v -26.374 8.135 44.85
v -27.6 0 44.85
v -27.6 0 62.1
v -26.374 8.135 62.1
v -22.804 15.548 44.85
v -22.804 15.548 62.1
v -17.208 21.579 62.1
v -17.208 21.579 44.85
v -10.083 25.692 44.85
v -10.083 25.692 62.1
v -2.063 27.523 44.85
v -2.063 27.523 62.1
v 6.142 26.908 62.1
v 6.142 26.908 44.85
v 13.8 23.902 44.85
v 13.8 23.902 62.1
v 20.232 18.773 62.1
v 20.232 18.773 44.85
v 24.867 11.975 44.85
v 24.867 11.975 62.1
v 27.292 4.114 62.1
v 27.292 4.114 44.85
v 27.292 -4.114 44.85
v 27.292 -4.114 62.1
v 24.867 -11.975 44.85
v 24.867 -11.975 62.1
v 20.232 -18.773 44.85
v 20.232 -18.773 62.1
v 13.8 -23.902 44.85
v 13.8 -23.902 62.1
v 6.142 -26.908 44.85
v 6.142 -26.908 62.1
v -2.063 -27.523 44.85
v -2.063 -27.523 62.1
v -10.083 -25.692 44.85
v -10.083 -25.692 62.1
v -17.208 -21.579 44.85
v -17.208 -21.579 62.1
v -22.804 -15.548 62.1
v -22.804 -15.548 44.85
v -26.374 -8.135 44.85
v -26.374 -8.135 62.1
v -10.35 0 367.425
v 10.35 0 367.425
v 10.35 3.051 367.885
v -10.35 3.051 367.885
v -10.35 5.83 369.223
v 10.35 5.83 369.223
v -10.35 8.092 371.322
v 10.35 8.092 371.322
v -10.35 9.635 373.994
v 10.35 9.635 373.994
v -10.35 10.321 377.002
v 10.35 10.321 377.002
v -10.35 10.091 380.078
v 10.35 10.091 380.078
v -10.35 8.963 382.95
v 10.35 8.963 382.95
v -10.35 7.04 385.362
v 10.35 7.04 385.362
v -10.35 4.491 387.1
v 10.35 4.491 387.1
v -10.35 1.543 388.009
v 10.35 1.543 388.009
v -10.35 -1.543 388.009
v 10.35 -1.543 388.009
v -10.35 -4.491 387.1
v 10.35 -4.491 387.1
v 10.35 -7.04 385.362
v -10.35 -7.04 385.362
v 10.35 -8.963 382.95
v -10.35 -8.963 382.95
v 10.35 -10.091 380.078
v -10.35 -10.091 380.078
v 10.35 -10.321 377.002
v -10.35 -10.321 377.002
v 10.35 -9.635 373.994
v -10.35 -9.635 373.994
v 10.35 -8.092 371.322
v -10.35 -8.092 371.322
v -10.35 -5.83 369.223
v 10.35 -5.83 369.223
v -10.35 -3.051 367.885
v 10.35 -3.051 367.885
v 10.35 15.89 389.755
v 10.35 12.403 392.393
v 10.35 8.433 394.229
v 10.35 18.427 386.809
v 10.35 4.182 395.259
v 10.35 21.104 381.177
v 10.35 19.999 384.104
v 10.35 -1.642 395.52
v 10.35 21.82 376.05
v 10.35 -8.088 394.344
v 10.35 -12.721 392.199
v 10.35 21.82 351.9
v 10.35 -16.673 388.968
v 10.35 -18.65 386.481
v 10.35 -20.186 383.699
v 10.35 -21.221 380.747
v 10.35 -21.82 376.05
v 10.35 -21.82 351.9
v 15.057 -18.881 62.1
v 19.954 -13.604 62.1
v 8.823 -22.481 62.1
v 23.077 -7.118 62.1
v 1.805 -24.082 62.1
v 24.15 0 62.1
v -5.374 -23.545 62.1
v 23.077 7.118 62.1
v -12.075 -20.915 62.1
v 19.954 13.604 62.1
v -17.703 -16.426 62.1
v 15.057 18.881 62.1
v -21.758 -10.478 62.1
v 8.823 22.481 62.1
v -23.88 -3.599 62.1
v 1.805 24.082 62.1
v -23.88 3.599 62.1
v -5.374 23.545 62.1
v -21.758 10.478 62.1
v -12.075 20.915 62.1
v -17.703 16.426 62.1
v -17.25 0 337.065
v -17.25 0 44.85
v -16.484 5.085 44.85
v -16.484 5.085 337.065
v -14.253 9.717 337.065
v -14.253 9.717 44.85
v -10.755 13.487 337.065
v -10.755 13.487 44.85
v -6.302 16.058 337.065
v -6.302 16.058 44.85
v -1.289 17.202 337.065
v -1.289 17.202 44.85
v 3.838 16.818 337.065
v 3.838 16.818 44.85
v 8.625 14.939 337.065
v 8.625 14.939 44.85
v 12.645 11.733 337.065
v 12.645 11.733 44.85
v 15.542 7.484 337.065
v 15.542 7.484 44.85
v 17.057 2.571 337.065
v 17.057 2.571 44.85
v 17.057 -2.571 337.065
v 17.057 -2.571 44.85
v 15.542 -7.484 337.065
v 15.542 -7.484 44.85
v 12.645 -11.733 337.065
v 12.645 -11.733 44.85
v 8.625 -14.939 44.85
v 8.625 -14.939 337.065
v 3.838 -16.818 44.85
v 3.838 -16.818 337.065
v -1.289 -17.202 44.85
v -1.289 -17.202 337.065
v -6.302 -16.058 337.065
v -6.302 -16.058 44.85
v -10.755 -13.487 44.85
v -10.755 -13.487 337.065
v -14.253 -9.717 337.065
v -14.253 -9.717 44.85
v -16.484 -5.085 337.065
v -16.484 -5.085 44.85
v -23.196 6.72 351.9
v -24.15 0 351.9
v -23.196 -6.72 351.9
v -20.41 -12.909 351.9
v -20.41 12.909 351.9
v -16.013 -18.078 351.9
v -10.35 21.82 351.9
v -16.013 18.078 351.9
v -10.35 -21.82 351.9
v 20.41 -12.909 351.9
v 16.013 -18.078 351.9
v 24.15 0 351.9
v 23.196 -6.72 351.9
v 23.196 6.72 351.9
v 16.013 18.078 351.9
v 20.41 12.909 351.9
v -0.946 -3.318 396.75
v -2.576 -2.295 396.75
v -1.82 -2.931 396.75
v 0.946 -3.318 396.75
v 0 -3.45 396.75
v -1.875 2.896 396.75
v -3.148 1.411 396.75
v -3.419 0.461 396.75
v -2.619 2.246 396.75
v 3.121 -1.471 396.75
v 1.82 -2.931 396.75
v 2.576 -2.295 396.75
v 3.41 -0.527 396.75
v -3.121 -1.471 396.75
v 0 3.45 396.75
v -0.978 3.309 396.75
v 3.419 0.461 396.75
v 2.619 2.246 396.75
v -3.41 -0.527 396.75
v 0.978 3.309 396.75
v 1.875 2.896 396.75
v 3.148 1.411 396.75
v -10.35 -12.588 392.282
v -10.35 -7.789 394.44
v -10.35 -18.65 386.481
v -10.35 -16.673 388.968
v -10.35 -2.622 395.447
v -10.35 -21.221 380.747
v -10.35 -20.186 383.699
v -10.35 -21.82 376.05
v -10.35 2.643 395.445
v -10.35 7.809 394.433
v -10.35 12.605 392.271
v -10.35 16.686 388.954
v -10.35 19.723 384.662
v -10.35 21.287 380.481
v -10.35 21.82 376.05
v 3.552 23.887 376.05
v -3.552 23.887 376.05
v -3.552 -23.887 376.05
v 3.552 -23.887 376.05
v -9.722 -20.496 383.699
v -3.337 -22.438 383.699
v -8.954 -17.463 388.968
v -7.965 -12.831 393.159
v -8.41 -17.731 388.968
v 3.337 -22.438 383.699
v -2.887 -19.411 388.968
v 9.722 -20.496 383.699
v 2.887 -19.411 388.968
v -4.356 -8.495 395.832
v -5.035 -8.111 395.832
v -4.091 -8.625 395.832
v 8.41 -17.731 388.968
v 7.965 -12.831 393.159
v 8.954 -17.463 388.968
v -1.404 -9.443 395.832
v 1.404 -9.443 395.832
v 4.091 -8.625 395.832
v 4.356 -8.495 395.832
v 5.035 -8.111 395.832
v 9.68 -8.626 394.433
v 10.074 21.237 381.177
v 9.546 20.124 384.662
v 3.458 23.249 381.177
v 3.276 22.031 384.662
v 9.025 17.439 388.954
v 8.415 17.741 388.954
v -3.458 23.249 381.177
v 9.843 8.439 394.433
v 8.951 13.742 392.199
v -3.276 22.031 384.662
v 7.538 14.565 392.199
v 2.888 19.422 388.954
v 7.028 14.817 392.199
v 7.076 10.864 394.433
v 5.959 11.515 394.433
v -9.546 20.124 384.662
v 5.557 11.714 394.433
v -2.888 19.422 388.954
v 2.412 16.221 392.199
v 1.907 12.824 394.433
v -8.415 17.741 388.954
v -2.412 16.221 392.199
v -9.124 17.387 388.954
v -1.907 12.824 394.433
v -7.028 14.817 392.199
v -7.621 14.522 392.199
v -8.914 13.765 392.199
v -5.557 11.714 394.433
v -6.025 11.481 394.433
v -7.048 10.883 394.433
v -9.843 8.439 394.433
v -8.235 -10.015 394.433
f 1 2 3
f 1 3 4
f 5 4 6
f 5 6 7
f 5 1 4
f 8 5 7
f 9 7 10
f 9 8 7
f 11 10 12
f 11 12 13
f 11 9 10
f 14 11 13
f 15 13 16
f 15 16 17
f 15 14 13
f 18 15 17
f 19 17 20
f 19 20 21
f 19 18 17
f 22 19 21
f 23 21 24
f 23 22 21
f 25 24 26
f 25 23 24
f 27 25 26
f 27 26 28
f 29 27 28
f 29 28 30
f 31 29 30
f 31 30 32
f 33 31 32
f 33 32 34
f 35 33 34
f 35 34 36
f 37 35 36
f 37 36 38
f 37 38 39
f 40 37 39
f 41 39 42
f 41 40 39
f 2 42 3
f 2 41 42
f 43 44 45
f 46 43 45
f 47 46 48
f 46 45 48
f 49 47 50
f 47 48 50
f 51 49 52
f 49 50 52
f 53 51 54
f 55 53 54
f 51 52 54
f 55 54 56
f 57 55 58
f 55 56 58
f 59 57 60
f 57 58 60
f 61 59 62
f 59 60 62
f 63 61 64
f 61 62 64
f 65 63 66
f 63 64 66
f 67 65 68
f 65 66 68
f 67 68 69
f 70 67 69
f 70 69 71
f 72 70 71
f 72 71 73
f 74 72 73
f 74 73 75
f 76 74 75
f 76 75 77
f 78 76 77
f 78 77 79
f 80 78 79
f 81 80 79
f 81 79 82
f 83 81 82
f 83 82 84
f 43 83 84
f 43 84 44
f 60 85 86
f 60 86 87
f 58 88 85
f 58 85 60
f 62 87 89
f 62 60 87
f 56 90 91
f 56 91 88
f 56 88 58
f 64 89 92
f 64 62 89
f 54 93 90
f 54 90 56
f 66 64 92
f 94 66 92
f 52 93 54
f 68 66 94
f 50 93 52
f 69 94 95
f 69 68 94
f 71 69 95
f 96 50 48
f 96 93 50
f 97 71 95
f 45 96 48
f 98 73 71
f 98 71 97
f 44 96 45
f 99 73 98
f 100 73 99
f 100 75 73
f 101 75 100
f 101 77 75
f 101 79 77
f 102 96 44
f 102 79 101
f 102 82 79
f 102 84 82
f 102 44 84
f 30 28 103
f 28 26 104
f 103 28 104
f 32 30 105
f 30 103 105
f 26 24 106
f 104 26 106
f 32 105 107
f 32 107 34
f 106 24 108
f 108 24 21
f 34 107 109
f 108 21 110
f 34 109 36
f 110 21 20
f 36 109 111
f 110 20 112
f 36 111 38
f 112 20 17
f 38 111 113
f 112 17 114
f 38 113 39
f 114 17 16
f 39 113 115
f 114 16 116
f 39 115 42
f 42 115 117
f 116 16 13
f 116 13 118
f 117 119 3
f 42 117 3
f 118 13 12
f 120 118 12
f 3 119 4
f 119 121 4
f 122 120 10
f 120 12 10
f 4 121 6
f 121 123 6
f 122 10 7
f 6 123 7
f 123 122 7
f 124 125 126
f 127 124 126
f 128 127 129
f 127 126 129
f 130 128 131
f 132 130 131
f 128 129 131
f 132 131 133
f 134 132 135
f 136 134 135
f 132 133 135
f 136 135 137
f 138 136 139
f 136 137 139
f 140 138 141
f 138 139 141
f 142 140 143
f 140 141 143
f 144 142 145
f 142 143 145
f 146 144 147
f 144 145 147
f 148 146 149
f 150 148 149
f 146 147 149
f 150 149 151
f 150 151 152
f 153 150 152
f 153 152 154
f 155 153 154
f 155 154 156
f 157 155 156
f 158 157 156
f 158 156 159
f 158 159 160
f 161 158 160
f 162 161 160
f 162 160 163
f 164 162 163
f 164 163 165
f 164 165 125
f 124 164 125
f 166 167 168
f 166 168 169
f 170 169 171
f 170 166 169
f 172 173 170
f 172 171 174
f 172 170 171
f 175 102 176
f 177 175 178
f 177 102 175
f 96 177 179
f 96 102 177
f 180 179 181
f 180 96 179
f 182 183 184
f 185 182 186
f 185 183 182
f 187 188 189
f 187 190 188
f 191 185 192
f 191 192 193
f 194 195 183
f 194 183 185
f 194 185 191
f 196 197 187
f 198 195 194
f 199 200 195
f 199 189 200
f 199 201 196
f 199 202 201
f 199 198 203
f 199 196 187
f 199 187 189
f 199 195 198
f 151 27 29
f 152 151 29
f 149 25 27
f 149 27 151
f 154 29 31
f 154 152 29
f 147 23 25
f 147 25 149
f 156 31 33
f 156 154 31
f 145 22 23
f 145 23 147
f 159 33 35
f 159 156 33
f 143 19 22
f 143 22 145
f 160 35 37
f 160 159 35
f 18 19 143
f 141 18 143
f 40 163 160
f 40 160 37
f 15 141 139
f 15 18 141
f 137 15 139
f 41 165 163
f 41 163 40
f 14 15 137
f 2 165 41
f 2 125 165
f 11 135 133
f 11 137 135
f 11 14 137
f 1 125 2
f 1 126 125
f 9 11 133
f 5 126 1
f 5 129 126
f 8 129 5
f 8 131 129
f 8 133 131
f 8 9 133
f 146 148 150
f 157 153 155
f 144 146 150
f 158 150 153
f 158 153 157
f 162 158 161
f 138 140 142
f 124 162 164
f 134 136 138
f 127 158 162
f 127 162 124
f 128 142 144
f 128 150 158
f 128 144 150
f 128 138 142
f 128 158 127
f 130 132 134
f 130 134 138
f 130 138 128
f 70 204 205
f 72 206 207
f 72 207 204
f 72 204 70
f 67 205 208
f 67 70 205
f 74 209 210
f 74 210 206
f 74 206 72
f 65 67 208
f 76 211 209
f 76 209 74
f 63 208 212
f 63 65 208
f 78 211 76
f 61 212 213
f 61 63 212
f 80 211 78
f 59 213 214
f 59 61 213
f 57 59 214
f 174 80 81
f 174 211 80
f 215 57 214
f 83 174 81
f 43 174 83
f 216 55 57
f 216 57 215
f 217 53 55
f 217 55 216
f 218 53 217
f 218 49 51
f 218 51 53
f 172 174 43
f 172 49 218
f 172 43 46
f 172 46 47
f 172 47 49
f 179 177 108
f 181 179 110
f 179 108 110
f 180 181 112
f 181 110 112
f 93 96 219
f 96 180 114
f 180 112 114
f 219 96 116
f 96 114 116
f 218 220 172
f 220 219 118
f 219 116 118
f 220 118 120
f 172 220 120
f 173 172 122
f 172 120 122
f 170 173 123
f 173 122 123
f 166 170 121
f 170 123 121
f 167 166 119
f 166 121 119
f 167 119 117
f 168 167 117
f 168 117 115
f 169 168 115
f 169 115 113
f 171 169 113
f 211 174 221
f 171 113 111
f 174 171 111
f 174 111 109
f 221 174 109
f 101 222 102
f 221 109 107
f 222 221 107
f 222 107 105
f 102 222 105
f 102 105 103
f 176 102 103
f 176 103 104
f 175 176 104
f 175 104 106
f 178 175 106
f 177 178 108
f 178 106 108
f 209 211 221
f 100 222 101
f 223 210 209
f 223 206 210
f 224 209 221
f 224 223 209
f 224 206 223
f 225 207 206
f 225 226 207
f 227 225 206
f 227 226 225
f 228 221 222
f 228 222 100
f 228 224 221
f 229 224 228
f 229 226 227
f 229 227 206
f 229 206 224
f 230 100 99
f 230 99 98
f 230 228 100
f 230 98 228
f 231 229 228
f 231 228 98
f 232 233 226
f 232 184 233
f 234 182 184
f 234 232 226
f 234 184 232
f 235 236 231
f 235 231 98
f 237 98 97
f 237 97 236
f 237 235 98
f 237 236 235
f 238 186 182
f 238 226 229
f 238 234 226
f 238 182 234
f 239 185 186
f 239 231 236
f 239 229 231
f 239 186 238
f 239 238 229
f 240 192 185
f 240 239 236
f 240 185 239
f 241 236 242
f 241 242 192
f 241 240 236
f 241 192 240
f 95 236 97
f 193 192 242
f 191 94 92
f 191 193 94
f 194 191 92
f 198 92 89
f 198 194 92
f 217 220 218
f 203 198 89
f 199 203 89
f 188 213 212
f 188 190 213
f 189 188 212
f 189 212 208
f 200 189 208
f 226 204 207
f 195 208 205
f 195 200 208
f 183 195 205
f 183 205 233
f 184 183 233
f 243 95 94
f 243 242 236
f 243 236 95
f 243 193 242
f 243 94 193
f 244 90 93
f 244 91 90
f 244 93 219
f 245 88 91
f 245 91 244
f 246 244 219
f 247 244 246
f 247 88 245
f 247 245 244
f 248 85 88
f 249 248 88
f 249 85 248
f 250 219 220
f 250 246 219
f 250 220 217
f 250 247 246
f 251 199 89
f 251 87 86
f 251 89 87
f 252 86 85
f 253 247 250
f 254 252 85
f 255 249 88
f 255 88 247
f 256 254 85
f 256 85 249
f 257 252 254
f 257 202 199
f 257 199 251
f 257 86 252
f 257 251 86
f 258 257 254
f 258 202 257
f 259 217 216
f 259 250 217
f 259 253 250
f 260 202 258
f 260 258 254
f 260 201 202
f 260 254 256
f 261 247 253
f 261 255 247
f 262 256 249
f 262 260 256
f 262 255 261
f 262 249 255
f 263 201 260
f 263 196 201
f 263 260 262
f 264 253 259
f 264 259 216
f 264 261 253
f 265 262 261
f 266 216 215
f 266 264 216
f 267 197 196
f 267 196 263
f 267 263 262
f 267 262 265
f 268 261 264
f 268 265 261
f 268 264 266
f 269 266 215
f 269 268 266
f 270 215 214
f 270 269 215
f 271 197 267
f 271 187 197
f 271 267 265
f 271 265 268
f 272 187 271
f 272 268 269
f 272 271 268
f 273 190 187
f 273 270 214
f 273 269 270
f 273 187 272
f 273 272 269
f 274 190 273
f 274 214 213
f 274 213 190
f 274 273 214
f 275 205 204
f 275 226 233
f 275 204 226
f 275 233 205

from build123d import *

# Parameters (mm, degrees)
SKETCH_1_R          = 70
EXTRUDE_2_DEPTH     = 1150
CUT_EXTRUDE_START   = -130
CUT_EXTRUDE_1_DEPTH = 130
SKETCH_3_R          = 30
CUT_EXTRUDE_2_DEPTH = 130
FILLET_1_R          = 60
SKETCH_4_R          = 50
CUT_EXTRUDE_3_DEPTH = 977
SKETCH_5_R          = 79.849645552
CUT_EXTRUDE_4_DEPTH = 100
SKETCH_6_R          = 77.974086693
CUT_EXTRUDE_5_DEPTH = 30
SKETCH_7_R          = 80
SKETCH_7_R_2        = 70
EXTRUDE_4_DEPTH     = 50
SCALE_1_SCALE       = 0.345


with BuildPart() as part:
    # 草图1 → 凸台-拉伸2 (new body)
    with BuildSketch(Plane.XY):
        Circle(SKETCH_1_R)
    extrude(amount=EXTRUDE_2_DEPTH)

    # 草图2 → 切除-拉伸1 (cut)
    with BuildSketch(Plane.XY.offset(1150).offset(CUT_EXTRUDE_START)):
        with BuildLine():
            ThreePointArc((70, 0), (59.160797831, 37.416573868), (30, 63.245553203))
            Line((30, 63.245553203), (30, -63.245553203))
            ThreePointArc((30, -63.245553203), (59.160797831, -37.416573868), (70, 0))
        make_face()
        with BuildLine():
            Line((-30, -63.245553203), (-30, 63.245553203))
            ThreePointArc((-30, 63.245553203), (-70, 0), (-30, -63.245553203))
        make_face()
    extrude(amount=CUT_EXTRUDE_1_DEPTH, mode=Mode.SUBTRACT)

    # 草图3 → 切除-拉伸2 (cut)
    with BuildSketch(Plane(origin=(30, 0, 0), x_dir=(0, 0, -1), z_dir=(1, 0, 0))):
        with Locations((-1095, 0)):
            Circle(SKETCH_3_R)
    extrude(amount=-CUT_EXTRUDE_2_DEPTH, mode=Mode.SUBTRACT)

    # 圆角1
    # the kernel refuses this fillet: 60 mm, written as the material it takes off along each edge
    with BuildSketch(Plane(origin=(0, 0, 1150), x_dir=(0.527411317590309, -0.8496100882626421, 0), z_dir=(-0.8496100882626421, -0.527411317590309, 0))) as fillet_1_piece_1:
        with BuildLine():
            CenterArc((70 - FILLET_1_R, -FILLET_1_R), FILLET_1_R, 0, 90)
            Line((70 - FILLET_1_R, 0), (70, 0))
            Line((70, 0), (70, -FILLET_1_R))
        make_face()
    revolve(axis=Axis((0, 0, 1150), (0, 0, 1)), revolution_arc=296.338571462, mode=Mode.SUBTRACT)
    with BuildSketch(Plane(origin=(0, 0, 1150), x_dir=(-0.527411317590308, 0.8496100882626425, 0), z_dir=(0.8496100882626425, 0.527411317590308, 0))) as fillet_1_piece_2:
        with BuildLine():
            CenterArc((70 - FILLET_1_R, -FILLET_1_R), FILLET_1_R, 0, 90)
            Line((70 - FILLET_1_R, 0), (70, 0))
            Line((70, 0), (70, -FILLET_1_R))
        make_face()
    revolve(axis=Axis((0, 0, 1150), (0, 0, 1)), revolution_arc=296.338571462, mode=Mode.SUBTRACT)

    # 草图4 → 切除-拉伸3 (cut)
    with BuildSketch(Plane(origin=(0, 0, 0), x_dir=(-1, 0, 0), z_dir=(0, 0, -1))):
        Circle(SKETCH_4_R)
    extrude(amount=-CUT_EXTRUDE_3_DEPTH, mode=Mode.SUBTRACT)

    # 草图5 → 切除-拉伸4 (cut)
    with BuildSketch(Plane(origin=(0, 0, 0), x_dir=(-1, 0, 0), z_dir=(0, 0, -1))):
        Circle(SKETCH_5_R)
    extrude(amount=-CUT_EXTRUDE_4_DEPTH, mode=Mode.SUBTRACT)

    # 草图6 → 切除-拉伸5 (cut)
    with BuildSketch(Plane(origin=(0, 0, 100), x_dir=(-1, 0, 0), z_dir=(0, 0, -1))):
        Circle(SKETCH_6_R)
    extrude(amount=-CUT_EXTRUDE_5_DEPTH, mode=Mode.SUBTRACT)

    # 草图7 → 凸台-拉伸4 (add)
    with BuildSketch(Plane(origin=(0, 0, 130), x_dir=(-1, 0, 0), z_dir=(0, 0, -1))):
        Circle(SKETCH_7_R)
        Circle(SKETCH_7_R_2, mode=Mode.SUBTRACT)
    extrude(amount=-EXTRUDE_4_DEPTH)


with BuildPart() as part_1:
    # 缩放比例1: scaled about (0, 0, 0)
    add(part.part.scale(SCALE_1_SCALE))


solid = part_1.part
